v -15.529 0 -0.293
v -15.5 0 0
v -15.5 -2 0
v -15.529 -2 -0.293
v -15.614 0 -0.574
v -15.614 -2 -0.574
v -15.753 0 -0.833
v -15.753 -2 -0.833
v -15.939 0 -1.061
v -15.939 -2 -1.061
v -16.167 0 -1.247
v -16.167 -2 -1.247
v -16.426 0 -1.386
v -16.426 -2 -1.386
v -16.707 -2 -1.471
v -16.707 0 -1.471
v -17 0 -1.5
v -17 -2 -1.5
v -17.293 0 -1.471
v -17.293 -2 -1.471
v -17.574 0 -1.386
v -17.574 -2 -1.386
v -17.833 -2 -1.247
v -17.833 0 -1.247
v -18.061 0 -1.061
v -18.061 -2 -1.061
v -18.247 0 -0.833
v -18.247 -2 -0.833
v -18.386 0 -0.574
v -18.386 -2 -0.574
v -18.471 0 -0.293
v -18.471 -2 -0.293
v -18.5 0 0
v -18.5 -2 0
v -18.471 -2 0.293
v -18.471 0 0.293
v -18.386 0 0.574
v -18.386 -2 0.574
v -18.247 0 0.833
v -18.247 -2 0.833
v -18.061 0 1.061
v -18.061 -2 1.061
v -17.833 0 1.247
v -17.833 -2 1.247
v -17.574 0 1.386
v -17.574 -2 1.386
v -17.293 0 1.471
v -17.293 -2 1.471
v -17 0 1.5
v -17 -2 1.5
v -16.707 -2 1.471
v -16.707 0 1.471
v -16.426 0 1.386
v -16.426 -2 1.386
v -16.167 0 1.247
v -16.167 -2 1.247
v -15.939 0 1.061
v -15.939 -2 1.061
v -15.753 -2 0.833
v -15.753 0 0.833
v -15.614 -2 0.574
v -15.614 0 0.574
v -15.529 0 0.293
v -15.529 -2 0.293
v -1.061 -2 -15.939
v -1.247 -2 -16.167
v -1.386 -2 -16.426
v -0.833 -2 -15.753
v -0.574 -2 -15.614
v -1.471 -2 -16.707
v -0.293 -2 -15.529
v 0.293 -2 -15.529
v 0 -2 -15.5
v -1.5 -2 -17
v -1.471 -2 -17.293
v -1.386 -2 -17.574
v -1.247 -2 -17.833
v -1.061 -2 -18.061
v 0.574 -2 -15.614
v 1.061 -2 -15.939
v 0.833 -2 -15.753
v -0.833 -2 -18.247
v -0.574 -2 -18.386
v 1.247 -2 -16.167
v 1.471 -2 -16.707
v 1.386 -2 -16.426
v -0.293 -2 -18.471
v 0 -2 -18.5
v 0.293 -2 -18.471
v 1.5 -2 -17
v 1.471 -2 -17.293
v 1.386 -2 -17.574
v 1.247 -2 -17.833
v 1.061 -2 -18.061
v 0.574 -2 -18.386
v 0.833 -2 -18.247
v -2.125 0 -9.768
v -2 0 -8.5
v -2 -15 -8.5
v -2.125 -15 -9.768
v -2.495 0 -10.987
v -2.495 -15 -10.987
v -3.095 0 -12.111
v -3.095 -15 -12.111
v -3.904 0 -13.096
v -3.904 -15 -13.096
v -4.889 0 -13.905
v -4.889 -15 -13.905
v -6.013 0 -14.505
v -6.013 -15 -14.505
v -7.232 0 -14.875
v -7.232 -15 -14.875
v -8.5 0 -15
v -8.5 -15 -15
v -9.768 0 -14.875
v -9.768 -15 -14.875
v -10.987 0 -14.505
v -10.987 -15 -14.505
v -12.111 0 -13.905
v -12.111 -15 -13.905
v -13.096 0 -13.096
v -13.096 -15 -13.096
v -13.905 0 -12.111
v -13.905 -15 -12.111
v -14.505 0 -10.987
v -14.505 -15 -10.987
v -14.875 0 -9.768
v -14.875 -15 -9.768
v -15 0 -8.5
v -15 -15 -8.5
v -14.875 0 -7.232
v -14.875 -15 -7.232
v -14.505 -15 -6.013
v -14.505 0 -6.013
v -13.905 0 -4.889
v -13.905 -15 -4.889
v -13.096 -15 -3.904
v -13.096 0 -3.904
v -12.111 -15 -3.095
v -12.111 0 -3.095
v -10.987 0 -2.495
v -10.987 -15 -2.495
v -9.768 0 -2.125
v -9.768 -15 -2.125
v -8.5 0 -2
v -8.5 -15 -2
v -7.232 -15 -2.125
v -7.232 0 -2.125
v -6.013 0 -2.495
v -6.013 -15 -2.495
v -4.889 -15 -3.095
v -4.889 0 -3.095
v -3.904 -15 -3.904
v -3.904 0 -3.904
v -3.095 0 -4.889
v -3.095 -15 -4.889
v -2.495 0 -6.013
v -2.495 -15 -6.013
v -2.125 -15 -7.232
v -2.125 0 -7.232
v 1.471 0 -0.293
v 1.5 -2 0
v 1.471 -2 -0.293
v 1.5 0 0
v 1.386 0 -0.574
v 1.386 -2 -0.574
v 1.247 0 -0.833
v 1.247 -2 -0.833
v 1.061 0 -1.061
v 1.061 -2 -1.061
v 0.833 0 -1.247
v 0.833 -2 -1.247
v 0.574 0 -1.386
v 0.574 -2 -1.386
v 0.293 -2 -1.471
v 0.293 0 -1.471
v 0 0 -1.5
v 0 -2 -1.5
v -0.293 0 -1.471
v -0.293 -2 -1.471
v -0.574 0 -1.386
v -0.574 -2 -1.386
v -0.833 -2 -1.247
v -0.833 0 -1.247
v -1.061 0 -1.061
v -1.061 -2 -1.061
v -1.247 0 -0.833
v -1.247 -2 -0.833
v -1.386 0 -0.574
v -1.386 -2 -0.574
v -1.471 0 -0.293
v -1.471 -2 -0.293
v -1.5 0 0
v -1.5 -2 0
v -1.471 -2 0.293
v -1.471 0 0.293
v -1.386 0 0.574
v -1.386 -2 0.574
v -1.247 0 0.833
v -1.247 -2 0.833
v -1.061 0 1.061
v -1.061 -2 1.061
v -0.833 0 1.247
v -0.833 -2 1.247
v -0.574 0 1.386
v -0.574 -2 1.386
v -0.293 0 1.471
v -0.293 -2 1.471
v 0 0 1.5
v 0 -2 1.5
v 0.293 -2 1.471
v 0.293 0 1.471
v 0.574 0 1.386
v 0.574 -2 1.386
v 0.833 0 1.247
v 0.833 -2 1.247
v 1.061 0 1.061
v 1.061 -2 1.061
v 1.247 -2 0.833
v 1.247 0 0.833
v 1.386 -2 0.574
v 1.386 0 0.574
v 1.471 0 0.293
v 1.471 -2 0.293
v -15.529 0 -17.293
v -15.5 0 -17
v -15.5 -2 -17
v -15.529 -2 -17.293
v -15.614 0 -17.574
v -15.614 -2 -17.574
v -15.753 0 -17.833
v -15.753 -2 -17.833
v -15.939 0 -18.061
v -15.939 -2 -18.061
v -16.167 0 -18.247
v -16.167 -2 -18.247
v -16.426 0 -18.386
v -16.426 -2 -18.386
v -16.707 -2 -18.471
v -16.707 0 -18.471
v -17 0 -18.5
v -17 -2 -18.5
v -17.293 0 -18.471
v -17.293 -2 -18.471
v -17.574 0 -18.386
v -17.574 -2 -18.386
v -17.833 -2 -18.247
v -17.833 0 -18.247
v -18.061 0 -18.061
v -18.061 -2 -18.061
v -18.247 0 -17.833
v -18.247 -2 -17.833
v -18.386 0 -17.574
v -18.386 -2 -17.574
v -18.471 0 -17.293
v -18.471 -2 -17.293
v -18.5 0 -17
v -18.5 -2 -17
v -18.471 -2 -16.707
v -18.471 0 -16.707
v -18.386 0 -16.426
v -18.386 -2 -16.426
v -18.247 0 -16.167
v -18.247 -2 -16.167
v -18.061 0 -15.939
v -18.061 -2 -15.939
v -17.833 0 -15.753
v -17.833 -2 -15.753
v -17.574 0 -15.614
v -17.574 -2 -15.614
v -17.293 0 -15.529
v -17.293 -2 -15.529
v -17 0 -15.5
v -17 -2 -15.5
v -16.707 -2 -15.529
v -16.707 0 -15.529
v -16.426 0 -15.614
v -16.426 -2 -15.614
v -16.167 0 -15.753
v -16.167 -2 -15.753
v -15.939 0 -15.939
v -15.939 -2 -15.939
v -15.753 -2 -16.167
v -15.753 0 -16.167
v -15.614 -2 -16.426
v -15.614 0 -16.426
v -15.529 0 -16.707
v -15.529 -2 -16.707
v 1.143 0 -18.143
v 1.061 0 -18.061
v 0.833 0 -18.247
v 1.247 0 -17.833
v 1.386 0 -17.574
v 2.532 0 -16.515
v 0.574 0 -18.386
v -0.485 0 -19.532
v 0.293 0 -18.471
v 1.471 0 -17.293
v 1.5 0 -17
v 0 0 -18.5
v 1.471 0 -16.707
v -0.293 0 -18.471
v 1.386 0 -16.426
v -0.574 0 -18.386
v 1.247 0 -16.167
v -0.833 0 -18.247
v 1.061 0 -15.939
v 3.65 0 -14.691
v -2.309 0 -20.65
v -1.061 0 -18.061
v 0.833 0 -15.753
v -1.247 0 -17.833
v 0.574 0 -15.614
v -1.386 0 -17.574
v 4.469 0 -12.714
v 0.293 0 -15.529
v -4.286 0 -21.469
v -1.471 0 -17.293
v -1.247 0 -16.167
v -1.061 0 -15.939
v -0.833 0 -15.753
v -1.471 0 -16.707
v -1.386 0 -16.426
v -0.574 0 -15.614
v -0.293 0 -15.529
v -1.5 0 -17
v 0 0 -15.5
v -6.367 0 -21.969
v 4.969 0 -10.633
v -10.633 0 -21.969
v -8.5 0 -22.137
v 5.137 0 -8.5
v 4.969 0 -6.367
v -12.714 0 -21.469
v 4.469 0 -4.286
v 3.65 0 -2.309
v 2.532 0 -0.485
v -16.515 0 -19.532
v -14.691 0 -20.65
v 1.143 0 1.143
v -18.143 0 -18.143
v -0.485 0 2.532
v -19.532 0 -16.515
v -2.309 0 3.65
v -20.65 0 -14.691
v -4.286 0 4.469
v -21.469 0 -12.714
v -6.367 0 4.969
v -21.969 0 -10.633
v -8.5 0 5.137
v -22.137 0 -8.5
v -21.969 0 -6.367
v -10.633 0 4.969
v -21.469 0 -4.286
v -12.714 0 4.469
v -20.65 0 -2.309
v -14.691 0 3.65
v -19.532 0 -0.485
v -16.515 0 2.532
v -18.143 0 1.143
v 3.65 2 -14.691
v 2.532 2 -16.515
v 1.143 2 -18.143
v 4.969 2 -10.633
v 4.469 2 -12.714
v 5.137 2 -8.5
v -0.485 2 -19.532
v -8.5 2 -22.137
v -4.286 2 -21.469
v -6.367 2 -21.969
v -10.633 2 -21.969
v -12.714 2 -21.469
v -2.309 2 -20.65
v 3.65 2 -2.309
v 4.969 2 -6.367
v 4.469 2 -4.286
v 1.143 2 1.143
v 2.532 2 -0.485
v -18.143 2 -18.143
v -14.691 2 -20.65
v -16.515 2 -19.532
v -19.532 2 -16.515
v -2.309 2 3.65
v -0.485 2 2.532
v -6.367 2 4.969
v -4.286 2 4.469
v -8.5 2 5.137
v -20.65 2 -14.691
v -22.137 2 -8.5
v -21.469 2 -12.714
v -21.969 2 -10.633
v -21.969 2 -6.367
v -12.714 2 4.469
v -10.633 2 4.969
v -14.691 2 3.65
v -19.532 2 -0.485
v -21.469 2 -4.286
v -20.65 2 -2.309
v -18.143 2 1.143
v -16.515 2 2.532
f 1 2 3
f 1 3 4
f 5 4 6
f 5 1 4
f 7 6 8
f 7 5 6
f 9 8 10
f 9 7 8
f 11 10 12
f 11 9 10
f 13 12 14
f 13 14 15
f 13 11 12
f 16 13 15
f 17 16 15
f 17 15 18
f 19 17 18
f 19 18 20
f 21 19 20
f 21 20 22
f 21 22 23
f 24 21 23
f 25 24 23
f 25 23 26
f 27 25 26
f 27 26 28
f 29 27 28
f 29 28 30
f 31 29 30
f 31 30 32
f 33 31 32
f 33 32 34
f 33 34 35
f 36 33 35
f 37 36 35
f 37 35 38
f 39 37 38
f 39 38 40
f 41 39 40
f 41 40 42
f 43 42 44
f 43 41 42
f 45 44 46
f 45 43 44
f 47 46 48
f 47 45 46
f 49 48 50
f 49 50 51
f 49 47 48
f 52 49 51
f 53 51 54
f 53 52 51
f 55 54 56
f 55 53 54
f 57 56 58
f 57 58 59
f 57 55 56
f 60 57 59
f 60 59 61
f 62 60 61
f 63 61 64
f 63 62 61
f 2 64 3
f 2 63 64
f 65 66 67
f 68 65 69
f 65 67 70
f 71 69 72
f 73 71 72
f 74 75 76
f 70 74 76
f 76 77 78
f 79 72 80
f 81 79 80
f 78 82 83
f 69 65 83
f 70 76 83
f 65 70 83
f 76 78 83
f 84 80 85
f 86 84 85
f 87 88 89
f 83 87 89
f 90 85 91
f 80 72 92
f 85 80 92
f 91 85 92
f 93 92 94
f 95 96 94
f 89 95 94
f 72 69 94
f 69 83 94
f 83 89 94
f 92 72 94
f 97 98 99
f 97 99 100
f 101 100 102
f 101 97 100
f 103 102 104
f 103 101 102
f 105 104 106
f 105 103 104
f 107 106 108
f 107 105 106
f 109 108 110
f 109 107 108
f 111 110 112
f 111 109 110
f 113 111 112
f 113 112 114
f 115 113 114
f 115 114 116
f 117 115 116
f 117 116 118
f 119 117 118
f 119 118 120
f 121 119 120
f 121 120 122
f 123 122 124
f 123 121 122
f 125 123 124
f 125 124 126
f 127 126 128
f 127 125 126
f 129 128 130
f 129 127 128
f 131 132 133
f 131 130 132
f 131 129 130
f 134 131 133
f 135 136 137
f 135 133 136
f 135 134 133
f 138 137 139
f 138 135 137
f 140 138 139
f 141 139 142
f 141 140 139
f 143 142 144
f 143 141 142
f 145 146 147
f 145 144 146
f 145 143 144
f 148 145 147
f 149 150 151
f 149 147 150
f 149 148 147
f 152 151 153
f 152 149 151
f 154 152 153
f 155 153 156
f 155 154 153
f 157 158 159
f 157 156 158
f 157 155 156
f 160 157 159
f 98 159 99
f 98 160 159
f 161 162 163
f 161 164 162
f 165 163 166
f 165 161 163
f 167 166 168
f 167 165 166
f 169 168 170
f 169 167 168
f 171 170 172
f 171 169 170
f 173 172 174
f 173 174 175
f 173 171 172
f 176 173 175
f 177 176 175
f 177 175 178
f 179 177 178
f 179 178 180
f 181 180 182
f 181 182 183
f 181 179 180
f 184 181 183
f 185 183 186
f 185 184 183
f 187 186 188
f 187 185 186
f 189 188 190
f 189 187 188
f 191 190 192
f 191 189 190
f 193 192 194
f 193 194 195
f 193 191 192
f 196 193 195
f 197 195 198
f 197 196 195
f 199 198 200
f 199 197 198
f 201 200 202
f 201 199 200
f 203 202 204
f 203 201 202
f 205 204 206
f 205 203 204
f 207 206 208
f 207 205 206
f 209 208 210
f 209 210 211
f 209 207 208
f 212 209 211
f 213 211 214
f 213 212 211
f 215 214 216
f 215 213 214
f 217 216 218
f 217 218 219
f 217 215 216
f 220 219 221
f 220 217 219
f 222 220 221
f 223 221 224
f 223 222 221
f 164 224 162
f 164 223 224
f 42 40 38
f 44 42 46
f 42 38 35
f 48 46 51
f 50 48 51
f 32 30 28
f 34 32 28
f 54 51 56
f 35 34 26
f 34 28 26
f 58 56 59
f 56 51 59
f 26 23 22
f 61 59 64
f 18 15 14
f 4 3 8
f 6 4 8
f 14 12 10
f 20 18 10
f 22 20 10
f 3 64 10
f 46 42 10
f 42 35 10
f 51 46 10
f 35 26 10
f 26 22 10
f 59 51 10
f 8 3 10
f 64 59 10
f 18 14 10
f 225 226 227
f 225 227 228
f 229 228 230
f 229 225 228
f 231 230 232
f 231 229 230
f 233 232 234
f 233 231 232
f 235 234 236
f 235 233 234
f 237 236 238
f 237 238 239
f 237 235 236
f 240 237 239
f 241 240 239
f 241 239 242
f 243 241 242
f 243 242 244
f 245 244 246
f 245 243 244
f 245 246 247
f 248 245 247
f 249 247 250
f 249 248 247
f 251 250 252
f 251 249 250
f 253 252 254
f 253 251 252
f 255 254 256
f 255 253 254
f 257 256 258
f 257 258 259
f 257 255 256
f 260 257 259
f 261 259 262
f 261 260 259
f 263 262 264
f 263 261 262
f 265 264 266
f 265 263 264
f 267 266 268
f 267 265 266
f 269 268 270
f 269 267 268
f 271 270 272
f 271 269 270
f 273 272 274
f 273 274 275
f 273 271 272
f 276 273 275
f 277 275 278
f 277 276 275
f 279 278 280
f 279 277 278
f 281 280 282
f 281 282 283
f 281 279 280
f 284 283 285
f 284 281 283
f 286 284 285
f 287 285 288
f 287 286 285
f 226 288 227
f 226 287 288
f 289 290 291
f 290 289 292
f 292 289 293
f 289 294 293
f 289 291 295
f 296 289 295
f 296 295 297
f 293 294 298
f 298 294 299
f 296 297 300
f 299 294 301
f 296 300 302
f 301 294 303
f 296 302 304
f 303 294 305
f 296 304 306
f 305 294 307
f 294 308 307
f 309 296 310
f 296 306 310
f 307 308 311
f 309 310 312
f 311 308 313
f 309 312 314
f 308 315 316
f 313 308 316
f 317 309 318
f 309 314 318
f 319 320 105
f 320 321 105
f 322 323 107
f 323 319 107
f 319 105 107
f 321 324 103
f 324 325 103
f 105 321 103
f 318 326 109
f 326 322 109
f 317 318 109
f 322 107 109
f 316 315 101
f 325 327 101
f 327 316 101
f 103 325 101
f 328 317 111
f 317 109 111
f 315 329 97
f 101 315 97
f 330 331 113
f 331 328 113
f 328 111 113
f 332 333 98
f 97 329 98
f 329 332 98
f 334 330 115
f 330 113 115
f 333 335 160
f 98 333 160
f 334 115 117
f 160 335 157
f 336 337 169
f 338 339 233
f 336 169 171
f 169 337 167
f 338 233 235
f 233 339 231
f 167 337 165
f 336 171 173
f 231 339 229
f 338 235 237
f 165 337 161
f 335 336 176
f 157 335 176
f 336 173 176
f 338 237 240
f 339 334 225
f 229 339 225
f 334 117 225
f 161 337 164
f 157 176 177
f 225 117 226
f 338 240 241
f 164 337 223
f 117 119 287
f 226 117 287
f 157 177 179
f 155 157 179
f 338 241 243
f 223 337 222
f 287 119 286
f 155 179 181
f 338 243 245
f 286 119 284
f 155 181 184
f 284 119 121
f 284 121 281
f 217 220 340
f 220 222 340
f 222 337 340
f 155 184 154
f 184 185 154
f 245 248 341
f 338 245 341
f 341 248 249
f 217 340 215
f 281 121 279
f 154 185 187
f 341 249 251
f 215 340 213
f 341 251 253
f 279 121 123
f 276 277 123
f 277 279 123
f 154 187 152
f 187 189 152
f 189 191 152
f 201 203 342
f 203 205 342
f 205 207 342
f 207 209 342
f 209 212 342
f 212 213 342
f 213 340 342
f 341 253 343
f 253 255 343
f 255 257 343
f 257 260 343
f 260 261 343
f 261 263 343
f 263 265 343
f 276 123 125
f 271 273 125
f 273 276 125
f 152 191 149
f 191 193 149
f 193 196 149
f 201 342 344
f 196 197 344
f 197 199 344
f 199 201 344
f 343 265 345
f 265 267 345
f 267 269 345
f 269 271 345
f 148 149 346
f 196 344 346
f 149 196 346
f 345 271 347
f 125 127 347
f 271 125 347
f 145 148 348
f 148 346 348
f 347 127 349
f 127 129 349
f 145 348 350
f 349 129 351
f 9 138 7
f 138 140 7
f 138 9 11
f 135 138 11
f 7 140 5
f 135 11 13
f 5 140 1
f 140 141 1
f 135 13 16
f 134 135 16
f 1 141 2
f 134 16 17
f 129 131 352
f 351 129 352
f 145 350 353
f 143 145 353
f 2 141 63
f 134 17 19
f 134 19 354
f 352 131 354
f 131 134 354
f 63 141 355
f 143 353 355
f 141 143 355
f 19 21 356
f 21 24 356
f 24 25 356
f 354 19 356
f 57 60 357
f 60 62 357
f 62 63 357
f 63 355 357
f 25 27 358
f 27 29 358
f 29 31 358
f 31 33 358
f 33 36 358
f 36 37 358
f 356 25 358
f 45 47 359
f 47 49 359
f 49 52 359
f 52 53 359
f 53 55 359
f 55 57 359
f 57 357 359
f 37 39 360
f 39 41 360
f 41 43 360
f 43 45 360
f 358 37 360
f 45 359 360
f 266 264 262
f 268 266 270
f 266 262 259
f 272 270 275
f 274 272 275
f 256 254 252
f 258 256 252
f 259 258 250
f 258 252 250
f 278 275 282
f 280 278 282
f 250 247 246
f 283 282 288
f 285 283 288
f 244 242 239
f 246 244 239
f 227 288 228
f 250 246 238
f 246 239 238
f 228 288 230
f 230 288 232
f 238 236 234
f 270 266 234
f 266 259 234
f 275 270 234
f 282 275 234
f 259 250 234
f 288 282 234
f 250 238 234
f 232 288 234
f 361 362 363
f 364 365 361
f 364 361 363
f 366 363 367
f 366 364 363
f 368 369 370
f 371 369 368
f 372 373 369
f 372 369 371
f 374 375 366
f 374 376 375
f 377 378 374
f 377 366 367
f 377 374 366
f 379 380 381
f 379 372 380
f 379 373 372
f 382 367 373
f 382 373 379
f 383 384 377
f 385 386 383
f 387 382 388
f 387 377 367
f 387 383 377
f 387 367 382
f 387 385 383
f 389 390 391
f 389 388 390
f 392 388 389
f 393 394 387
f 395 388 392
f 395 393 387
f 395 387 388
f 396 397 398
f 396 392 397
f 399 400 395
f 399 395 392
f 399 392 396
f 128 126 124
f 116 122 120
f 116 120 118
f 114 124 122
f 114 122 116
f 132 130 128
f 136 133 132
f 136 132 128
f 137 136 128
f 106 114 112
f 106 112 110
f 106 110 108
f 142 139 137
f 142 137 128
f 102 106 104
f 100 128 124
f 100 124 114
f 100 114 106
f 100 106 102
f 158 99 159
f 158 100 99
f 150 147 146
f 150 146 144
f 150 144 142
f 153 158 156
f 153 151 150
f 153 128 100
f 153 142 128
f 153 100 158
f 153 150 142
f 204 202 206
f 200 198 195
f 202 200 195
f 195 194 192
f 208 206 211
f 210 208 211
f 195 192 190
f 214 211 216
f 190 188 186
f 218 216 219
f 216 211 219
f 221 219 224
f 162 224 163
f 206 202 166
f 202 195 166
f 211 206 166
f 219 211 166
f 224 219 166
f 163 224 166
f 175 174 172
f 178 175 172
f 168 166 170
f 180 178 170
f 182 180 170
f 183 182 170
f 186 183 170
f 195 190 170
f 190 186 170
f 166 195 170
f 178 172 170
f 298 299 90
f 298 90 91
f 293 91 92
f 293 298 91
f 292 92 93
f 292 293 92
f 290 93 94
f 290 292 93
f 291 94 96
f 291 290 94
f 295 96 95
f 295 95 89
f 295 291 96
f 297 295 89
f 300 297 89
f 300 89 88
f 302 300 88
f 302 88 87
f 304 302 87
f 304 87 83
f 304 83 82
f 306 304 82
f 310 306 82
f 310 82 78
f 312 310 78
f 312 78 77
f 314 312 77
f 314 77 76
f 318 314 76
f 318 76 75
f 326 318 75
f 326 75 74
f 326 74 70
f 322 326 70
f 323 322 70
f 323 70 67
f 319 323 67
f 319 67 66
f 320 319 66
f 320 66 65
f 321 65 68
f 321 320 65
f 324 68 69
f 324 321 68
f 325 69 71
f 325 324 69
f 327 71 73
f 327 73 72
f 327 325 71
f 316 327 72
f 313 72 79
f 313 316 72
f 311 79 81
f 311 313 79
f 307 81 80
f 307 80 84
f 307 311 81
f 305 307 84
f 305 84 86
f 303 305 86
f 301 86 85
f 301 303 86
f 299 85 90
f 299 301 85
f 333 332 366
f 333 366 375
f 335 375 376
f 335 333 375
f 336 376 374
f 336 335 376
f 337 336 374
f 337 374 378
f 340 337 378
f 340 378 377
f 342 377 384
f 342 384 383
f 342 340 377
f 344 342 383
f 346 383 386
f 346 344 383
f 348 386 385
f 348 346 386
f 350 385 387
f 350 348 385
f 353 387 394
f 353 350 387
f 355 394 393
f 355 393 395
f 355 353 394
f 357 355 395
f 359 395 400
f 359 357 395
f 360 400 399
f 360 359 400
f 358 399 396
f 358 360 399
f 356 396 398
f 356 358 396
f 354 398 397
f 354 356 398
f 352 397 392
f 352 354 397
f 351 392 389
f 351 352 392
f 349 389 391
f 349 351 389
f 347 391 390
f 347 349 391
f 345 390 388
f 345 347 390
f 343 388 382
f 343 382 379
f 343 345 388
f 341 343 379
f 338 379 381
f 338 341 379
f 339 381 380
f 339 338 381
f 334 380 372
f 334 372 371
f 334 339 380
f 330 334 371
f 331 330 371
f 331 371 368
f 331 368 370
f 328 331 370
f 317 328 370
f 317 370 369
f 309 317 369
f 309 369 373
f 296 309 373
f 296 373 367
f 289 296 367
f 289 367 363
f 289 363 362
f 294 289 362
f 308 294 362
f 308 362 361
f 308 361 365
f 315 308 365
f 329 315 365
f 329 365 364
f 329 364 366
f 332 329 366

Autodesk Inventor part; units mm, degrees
ref_plane "YZ Plane" through (0, 0, 0) normal (1, 0, 0) x (0, 1, 0)
ref_plane "XZ Plane" through (0, 0, 0) normal (0, 1, 0) x (-1, 0, 0)
ref_plane "XY Plane" through (0, 0, 0) normal (0, 0, 1) x (1, 0, 0)
sketch "Boceto1" plane through (0, 0, 0) normal (0, 1, 0) x (-1, 0, 0)
  line L0 (0, 0) -> (17, 0)
  line L1 (17, 0) -> (17, -17)
  line L2 (17, -17) -> (0, -17)
  line L3 (0, -17) -> (0, 0)
  circle A0 centre (17, 0) radius 1.5
  circle A1 centre (17, -17) radius 1.5
  circle A2 centre (0, -17) radius 1.5
  circle A3 centre (0, 0) radius 1.5
  circle A4 centre (8.5, -8.5) radius 14.1421
  dimension "d0" = 17
  dimension "d1" = 17
  dimension "d2" = 3
  dimension "d3" = 3
  dimension "d4" = 3
  dimension "d5" = 3
extrude "Extrusión1" add sketch "Boceto1" along normal blind 2 contours L0 A0 L1 A1 L2 A2 L3 A3 | A4
sketch "Boceto2" plane through (-8.5, 2, -8.5) normal (0, 1, 0) x (1, 0, 0)
  circle A0 centre (8.5, -8.5) radius 1.5
  circle A1 centre (8.5, 8.5) radius 1.5 projected
  circle A2 centre (8.5, 8.5) radius 1.5
  circle A3 centre (-8.5, 8.5) radius 1.5 projected
  circle A4 centre (-8.5, 8.5) radius 1.5
  circle A5 centre (-8.5, -8.5) radius 1.5 projected
  circle A6 centre (-8.5, -8.5) radius 1.5
extrude "Extrusión2" add sketch "Boceto2" against normal blind 4
sketch "Boceto3" plane through (-8.5, 0, -8.5) normal (0, -1, 0) x (1, 0, 0)
  circle A0 centre (0, 0) radius 6.5
  point P0 (8.5, 8.5)
  dimension "d10" = 13
extrude "Extrusión3" add sketch "Boceto3" along normal blind 15
sketch "Boceto4" plane through (-8.5, 0, -8.5) normal (0, -1, 0) x (1, 0, 0)
  circle A0 centre (0, 0) radius 6.5 projected
  circle A1 centre (0, 0) radius 13.6366
  circle A2 centre (0, 0) radius 6.5 projected
  circle A3 centre (0, 0) radius 14.1421
  point P0 (8.5, 8.5)
extrude "Extrusión4" cut sketch "Boceto4" against normal blind 10 contours A3
